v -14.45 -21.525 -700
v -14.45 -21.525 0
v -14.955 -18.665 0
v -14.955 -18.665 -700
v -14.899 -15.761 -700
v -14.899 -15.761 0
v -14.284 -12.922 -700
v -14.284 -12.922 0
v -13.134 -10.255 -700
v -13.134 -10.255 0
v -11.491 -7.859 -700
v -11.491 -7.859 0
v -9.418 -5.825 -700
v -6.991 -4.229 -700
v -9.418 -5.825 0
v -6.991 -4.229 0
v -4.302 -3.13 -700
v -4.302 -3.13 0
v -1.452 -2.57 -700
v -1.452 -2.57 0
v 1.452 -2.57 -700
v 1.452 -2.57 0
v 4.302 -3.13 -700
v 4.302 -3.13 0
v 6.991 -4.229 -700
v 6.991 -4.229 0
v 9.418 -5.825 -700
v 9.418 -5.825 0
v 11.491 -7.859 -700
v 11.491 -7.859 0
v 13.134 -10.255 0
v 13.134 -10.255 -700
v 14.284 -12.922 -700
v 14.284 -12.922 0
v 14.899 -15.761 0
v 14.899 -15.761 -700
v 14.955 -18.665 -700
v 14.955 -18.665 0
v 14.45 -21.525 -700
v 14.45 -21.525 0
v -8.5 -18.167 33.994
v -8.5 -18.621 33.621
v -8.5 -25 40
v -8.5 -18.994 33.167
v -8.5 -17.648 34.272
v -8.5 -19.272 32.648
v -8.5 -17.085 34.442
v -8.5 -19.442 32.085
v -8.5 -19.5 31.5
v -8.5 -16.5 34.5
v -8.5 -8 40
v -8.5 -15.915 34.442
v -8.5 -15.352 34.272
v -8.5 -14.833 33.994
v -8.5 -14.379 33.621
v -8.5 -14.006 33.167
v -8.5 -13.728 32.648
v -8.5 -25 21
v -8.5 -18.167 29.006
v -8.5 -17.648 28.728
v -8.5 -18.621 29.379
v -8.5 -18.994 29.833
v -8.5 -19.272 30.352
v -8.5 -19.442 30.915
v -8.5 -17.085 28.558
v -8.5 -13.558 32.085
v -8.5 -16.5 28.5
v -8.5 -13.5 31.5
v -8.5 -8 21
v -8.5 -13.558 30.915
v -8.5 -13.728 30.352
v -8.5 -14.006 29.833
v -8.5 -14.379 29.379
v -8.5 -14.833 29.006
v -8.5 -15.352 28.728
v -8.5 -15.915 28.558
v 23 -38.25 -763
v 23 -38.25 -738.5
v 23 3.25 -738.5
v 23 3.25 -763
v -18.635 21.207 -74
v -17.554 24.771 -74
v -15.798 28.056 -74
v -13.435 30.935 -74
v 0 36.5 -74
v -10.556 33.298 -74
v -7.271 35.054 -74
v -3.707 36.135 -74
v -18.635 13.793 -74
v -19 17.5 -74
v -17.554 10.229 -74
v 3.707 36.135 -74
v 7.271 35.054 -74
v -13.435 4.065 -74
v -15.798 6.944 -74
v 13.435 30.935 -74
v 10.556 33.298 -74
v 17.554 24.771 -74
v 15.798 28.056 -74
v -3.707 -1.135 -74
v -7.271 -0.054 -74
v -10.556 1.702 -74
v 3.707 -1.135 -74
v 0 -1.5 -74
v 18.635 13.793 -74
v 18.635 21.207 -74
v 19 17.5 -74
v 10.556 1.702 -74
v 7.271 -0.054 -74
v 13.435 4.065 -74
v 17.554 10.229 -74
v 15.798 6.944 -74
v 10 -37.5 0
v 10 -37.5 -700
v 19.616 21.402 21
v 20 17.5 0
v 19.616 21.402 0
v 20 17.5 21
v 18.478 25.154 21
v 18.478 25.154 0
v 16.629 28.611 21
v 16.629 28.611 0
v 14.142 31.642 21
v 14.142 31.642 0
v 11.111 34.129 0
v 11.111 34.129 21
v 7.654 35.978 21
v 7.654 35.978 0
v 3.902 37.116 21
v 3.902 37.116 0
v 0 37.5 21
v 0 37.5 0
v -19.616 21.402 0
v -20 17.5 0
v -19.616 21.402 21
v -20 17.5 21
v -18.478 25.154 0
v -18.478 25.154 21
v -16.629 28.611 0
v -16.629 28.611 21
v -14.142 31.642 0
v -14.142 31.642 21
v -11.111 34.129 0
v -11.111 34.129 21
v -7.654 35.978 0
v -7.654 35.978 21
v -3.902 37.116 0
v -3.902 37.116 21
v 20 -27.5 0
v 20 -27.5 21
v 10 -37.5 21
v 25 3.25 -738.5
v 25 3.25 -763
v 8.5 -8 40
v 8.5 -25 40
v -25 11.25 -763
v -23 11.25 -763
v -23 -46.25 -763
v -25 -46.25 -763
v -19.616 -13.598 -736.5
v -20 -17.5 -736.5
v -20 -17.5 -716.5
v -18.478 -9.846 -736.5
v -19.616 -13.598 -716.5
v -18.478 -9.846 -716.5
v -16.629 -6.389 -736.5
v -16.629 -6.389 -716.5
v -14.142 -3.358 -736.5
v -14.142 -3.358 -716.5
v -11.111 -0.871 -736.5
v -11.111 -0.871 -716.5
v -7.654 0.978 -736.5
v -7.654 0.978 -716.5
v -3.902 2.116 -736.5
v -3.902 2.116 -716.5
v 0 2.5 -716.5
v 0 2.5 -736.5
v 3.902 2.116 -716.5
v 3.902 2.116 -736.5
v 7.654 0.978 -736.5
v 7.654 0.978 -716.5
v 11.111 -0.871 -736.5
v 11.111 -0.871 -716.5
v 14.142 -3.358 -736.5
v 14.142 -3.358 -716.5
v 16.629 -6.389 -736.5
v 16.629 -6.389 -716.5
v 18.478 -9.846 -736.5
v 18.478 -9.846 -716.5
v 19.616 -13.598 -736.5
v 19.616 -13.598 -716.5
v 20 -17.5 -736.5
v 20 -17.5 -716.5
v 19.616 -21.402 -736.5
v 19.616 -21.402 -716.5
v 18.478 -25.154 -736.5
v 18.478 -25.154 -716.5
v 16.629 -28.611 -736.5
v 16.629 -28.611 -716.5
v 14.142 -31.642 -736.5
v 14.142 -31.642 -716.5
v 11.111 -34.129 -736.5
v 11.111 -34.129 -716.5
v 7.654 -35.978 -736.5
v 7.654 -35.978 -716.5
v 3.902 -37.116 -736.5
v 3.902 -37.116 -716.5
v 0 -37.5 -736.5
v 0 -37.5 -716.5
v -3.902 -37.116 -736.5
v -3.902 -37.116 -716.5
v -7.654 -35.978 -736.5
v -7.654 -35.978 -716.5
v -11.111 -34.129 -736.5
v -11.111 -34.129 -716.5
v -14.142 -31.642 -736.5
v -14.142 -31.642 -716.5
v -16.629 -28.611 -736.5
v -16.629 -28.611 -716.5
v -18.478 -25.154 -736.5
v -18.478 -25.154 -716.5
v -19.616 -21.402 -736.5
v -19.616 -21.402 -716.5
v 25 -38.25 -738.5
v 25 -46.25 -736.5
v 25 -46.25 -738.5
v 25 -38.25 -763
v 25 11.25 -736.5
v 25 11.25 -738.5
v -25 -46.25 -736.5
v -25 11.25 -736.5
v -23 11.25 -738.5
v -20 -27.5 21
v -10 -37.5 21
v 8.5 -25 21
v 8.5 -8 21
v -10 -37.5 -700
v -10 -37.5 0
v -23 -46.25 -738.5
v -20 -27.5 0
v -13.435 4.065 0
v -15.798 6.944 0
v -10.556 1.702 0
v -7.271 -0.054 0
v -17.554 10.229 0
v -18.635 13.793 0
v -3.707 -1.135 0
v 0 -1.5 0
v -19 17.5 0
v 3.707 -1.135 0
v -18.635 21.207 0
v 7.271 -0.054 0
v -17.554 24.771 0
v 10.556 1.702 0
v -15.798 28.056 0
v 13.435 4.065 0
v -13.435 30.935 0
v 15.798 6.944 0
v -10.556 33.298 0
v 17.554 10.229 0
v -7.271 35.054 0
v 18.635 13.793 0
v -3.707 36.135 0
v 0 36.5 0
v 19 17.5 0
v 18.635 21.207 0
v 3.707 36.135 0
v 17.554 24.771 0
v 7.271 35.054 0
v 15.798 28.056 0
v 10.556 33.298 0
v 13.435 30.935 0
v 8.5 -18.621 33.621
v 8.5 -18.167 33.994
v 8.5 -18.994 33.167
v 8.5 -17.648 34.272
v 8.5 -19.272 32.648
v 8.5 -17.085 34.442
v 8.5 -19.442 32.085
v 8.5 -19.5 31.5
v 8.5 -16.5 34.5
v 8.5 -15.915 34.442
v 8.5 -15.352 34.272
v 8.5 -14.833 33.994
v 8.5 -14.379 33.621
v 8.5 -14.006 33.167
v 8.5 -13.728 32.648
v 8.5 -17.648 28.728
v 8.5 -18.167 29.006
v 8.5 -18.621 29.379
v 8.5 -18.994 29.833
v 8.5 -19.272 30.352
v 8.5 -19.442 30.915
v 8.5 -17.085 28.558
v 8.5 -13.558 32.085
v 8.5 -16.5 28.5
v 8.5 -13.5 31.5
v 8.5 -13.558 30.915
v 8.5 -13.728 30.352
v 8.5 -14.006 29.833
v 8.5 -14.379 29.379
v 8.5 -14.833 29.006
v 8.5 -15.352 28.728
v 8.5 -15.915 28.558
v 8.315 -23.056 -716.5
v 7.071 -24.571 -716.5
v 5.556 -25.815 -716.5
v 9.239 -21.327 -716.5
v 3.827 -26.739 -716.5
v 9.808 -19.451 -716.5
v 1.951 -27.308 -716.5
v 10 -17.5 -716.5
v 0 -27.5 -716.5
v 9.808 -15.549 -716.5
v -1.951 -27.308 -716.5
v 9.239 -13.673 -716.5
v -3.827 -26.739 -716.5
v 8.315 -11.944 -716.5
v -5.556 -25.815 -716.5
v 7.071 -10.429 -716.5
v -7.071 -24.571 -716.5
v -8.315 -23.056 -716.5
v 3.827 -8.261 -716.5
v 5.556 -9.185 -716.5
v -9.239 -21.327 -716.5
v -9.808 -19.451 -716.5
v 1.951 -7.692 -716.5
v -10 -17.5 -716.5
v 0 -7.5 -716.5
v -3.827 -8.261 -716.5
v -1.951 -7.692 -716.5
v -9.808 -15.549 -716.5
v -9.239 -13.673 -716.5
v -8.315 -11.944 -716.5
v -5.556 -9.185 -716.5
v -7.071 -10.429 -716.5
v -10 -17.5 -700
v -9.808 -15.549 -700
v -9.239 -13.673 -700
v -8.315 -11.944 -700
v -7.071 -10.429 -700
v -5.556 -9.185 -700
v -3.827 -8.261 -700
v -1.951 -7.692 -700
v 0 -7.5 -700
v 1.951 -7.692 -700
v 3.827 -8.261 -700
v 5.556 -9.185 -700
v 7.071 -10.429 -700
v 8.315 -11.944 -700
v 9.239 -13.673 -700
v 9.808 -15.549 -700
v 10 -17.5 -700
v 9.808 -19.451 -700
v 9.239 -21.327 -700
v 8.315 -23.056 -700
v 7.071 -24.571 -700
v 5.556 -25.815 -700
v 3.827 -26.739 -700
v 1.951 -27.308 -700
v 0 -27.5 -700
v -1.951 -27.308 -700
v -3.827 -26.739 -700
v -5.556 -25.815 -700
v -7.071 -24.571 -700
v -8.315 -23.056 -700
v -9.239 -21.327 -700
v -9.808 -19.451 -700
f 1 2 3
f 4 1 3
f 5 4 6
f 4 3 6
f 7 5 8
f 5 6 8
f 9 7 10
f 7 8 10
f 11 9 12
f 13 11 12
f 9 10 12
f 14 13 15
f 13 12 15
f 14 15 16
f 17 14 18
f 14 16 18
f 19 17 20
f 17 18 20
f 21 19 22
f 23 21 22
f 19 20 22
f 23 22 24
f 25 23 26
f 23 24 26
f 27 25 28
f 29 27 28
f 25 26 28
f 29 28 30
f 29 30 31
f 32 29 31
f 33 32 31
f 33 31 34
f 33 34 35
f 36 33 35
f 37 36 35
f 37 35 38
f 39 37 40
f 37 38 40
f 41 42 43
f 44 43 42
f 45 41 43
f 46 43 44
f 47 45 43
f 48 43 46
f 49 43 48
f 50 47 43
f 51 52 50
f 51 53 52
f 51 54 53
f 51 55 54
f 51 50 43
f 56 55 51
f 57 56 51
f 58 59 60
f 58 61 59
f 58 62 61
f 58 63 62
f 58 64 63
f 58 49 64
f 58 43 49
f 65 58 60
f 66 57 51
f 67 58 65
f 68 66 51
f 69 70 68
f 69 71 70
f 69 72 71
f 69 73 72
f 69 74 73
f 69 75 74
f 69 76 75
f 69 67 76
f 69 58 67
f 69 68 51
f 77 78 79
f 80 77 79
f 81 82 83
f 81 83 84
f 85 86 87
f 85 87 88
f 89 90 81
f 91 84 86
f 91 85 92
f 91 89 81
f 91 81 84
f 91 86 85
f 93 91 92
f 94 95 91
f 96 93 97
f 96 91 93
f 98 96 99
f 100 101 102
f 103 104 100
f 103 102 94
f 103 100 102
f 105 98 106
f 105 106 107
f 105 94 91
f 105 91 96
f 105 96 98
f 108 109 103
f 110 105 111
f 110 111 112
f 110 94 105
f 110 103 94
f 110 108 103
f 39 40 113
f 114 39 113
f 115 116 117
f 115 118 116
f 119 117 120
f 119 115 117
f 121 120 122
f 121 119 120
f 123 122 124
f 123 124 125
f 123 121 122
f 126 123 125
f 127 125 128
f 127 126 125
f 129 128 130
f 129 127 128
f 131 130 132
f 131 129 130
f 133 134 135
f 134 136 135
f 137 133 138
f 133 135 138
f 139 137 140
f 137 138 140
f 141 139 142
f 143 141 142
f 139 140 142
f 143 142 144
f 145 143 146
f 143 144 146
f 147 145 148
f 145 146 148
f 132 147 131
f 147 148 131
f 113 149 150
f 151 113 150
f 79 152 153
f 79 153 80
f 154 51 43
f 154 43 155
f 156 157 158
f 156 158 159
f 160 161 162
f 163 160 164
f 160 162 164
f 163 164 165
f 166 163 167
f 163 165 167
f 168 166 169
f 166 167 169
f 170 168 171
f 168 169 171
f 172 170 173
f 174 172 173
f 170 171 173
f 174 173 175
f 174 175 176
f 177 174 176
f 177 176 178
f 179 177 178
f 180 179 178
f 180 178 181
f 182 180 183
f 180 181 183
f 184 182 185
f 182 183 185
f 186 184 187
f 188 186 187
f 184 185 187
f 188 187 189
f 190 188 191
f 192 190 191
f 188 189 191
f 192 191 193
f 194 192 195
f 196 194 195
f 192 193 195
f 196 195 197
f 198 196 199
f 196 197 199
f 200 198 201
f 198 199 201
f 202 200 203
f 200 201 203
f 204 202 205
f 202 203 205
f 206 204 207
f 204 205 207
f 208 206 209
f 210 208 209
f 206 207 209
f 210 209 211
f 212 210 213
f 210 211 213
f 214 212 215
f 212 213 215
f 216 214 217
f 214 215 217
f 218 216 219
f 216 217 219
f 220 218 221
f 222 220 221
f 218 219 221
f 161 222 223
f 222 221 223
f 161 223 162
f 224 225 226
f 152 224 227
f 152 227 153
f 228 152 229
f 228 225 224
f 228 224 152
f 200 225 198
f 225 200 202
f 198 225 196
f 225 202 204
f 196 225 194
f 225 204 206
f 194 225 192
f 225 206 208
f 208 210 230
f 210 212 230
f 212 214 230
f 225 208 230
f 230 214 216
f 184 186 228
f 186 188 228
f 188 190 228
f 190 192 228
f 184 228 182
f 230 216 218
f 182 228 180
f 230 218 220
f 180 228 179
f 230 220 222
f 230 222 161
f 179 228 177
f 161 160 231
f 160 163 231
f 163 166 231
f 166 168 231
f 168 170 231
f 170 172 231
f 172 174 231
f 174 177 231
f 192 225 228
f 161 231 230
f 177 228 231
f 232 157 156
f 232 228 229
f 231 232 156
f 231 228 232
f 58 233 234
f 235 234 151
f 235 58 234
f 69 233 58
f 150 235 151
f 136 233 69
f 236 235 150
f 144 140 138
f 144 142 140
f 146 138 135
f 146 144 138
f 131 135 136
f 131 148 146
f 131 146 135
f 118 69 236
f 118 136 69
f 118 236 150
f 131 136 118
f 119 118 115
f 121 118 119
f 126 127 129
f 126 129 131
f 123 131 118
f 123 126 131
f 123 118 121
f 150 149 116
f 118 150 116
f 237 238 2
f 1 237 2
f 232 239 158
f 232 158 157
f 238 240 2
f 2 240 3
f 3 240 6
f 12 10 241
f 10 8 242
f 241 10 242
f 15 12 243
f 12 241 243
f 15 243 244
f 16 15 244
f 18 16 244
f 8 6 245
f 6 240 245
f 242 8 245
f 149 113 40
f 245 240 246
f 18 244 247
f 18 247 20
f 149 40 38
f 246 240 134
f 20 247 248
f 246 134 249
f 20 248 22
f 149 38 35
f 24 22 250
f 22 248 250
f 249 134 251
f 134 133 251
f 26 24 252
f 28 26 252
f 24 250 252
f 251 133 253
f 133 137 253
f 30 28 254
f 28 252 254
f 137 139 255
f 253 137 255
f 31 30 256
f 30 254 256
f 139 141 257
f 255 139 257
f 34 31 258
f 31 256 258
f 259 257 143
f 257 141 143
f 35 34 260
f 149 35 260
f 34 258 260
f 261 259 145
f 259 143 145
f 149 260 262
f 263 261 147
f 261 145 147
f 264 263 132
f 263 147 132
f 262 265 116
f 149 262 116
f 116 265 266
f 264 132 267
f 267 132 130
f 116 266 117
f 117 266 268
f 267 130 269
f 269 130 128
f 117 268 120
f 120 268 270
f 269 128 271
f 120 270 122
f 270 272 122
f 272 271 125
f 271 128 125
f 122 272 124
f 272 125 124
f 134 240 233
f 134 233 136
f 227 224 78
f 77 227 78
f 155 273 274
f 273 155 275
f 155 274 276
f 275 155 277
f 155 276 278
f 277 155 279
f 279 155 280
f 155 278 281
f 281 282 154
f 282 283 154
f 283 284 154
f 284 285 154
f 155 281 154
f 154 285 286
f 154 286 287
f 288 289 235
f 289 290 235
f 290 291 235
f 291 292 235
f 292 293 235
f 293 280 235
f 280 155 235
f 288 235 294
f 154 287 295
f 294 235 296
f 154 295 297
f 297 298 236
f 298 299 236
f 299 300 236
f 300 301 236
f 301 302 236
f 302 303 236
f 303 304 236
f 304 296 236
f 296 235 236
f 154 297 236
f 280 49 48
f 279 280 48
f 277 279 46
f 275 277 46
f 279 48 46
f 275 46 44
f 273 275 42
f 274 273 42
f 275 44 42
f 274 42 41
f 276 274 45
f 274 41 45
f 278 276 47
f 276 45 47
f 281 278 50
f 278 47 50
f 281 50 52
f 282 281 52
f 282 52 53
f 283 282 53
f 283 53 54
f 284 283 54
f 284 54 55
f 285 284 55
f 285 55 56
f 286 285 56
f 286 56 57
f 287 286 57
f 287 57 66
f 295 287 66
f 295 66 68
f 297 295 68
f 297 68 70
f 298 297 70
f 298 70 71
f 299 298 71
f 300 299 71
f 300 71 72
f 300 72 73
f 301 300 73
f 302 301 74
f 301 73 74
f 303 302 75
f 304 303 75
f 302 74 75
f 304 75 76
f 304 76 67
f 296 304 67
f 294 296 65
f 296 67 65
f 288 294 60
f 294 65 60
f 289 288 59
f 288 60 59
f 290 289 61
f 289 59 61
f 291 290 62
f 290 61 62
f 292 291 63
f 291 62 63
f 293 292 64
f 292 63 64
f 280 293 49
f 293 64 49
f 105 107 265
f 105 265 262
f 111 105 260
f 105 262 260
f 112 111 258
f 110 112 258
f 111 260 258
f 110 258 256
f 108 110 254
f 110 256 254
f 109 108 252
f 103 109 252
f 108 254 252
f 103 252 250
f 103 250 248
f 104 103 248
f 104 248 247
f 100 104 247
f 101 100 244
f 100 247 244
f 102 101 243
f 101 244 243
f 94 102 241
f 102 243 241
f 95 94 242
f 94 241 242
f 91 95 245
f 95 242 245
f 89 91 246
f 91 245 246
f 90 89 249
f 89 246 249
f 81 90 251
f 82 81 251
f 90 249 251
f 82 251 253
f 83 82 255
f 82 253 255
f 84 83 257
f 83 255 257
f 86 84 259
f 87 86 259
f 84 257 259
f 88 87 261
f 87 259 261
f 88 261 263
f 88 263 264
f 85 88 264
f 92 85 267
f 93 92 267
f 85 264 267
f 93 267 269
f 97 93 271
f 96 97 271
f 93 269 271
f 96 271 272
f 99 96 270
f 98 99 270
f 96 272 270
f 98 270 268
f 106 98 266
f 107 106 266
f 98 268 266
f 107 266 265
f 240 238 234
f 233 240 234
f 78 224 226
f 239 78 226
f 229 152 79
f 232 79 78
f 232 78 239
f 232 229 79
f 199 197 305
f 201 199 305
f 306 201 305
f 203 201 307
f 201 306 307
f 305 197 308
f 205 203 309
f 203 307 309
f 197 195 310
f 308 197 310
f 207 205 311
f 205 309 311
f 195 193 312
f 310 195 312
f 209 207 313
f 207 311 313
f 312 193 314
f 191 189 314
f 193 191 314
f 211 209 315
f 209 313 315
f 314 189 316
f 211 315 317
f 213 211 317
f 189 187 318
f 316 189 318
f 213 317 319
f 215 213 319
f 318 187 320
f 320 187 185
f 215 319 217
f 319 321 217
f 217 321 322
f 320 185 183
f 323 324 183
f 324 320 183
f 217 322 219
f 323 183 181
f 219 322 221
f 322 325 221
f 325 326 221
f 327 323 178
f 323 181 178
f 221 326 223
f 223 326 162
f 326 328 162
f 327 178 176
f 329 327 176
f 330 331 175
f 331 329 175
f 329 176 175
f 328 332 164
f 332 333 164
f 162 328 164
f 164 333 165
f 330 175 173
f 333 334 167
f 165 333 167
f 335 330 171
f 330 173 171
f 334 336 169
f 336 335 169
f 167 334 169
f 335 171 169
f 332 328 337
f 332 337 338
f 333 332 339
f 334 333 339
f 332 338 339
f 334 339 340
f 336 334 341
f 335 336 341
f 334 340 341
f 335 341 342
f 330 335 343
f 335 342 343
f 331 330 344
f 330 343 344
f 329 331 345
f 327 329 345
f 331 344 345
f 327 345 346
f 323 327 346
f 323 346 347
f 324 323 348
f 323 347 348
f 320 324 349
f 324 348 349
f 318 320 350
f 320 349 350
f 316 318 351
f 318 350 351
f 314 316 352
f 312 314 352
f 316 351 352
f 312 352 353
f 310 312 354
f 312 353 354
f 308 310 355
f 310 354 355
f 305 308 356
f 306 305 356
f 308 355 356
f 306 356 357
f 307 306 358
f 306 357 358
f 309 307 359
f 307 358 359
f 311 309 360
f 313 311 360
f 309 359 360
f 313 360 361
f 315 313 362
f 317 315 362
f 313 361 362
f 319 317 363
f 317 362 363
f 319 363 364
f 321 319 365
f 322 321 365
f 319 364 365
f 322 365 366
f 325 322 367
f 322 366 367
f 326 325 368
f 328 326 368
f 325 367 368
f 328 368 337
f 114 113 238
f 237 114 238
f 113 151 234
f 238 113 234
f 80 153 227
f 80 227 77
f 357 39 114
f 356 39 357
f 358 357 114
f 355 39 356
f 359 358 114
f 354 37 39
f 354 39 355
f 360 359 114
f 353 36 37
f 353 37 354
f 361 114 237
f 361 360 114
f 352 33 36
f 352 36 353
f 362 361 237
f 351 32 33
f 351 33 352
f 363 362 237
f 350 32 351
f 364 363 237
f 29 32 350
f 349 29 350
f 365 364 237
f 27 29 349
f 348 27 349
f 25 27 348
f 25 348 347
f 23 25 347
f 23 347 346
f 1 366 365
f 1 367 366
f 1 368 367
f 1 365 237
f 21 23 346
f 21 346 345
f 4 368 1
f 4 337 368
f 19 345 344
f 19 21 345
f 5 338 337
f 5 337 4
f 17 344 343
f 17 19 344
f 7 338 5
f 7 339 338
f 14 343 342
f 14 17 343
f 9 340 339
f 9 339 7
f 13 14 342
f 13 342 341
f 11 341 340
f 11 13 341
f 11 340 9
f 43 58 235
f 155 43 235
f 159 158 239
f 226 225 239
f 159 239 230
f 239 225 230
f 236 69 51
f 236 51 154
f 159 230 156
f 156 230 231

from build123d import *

# Parameters (mm, degrees)
SKETCH_1_W          = 40
SKETCH_1_H          = 75
EXTRUDE_1_DEPTH     = 21
FILLET_1_R          = 20
CHAMFER_1_SIZE      = 10
EXTRUDE_2_DEPTH     = 700
SKETCH_3_R          = 19
EXTRUDE_4_DEPTH     = 74
SKETCH_4_W          = 17
SKETCH_4_H          = 17
EXTRUDE_5_DEPTH     = 19
SKETCH_5_R          = 3
CUT_EXTRUDE_1_DEPTH = 19
SKETCH_6_R          = 10
EXTRUDE_6_DEPTH     = 16.5
SKETCH_7_R          = 20
EXTRUDE_7_DEPTH     = 20
SKETCH_8_W          = 50
SKETCH_8_H          = 57.5
EXTRUDE_8_DEPTH     = 2
SKETCH_9_W          = 2
SKETCH_9_H          = 57.5
EXTRUDE_9_DEPTH     = 24.5
SKETCH_10_W         = 2
SKETCH_10_H         = 41.5
EXTRUDE_10_DEPTH    = 24.5


with BuildPart() as part:
    # 草图1 → 凸台-拉伸1 (new body)
    with BuildSketch(Plane.XY):
        Rectangle(SKETCH_1_W, SKETCH_1_H)
    extrude(amount=EXTRUDE_1_DEPTH)

    # 圆角1
    fillet_1_edges = [part.edges().sort_by_distance(p)[0] for p in [
        (-20, 37.5, 10.5),
        (20, 37.5, 10.5),
    ]]
    fillet(fillet_1_edges, radius=FILLET_1_R - 0.0001)  # a hair under: the kernel refuses the full size

    # 倒角1
    chamfer_1_edges = [part.edges().sort_by_distance(p)[0] for p in [
        (20, -37.5, 10.5),
        (-20, -37.5, 10.5),
    ]]
    chamfer(chamfer_1_edges, length=CHAMFER_1_SIZE)

    # 草图2 → 凸台-拉伸2 (add)
    with BuildSketch(Plane(origin=(0, 0, 0), x_dir=(-1, 0, 0), z_dir=(0, 0, -1))):
        with BuildLine():
            Line((-10, -37.5), (10, -37.5))
            Line((10, -37.5), (14.449874371, -21.525062814))
            ThreePointArc((14.449874371, -21.525062814), (0, -2.5), (-14.449874371, -21.525062814))
            Line((-14.449874371, -21.525062814), (-10, -37.5))
        make_face()
    extrude(amount=EXTRUDE_2_DEPTH)

    # 草图3 → 凸台-拉伸4 (add)
    with BuildSketch(Plane(origin=(0, 0, 0), x_dir=(-1, 0, 0), z_dir=(0, 0, -1))):
        with Locations(Location((0, 17.5, 0), (0, 0, 180))):
            Circle(SKETCH_3_R)
    extrude(amount=EXTRUDE_4_DEPTH)

    # 草图4 → 凸台-拉伸5 (add)
    with BuildSketch(Plane.XY.offset(21)):
        with Locations((0, -16.5)):
            Rectangle(SKETCH_4_W, SKETCH_4_H)
    extrude(amount=EXTRUDE_5_DEPTH)

    # 草图5 → 切除-拉伸1 (cut)
    with BuildSketch(Plane.ZY.offset(8.5)):
        with Locations(Location((31.5, -16.5, 0), (0, 0, 270))):
            Circle(SKETCH_5_R)
    extrude(amount=-CUT_EXTRUDE_1_DEPTH, mode=Mode.SUBTRACT)

    # 草图6 → 凸台-拉伸6 (add)
    with BuildSketch(Plane(origin=(0, 0, -700), x_dir=(-1, 0, 0), z_dir=(0, 0, -1))):
        with Locations((0, -17.5)):
            Circle(SKETCH_6_R)
    extrude(amount=EXTRUDE_6_DEPTH)

    # 草图7 → 凸台-拉伸7 (add)
    with BuildSketch(Plane(origin=(0, 0, -716.5), x_dir=(-1, 0, 0), z_dir=(0, 0, -1))):
        with Locations((0, -17.5)):
            Circle(SKETCH_7_R)
    extrude(amount=EXTRUDE_7_DEPTH)

    # 草图8 → 凸台-拉伸8 (add)
    with BuildSketch(Plane(origin=(0, 0, -736.5), x_dir=(-1, 0, 0), z_dir=(0, 0, -1))):
        with Locations((0, -17.5)):
            Rectangle(SKETCH_8_W, SKETCH_8_H)
    extrude(amount=EXTRUDE_8_DEPTH)

    # 草图9 → 凸台-拉伸9 (add)
    with BuildSketch(Plane(origin=(0, 0, -738.5), x_dir=(-1, 0, 0), z_dir=(0, 0, -1))):
        with Locations((24, -17.5)):
            Rectangle(SKETCH_9_W, SKETCH_9_H)
    extrude(amount=EXTRUDE_9_DEPTH)

    # 草图10 → 凸台-拉伸10 (add)
    with BuildSketch(Plane(origin=(0, 0, -738.5), x_dir=(-1, 0, 0), z_dir=(0, 0, -1))):
        with Locations((-24, -17.5)):
            Rectangle(SKETCH_10_W, SKETCH_10_H)
    extrude(amount=EXTRUDE_10_DEPTH)


solid = part.part
